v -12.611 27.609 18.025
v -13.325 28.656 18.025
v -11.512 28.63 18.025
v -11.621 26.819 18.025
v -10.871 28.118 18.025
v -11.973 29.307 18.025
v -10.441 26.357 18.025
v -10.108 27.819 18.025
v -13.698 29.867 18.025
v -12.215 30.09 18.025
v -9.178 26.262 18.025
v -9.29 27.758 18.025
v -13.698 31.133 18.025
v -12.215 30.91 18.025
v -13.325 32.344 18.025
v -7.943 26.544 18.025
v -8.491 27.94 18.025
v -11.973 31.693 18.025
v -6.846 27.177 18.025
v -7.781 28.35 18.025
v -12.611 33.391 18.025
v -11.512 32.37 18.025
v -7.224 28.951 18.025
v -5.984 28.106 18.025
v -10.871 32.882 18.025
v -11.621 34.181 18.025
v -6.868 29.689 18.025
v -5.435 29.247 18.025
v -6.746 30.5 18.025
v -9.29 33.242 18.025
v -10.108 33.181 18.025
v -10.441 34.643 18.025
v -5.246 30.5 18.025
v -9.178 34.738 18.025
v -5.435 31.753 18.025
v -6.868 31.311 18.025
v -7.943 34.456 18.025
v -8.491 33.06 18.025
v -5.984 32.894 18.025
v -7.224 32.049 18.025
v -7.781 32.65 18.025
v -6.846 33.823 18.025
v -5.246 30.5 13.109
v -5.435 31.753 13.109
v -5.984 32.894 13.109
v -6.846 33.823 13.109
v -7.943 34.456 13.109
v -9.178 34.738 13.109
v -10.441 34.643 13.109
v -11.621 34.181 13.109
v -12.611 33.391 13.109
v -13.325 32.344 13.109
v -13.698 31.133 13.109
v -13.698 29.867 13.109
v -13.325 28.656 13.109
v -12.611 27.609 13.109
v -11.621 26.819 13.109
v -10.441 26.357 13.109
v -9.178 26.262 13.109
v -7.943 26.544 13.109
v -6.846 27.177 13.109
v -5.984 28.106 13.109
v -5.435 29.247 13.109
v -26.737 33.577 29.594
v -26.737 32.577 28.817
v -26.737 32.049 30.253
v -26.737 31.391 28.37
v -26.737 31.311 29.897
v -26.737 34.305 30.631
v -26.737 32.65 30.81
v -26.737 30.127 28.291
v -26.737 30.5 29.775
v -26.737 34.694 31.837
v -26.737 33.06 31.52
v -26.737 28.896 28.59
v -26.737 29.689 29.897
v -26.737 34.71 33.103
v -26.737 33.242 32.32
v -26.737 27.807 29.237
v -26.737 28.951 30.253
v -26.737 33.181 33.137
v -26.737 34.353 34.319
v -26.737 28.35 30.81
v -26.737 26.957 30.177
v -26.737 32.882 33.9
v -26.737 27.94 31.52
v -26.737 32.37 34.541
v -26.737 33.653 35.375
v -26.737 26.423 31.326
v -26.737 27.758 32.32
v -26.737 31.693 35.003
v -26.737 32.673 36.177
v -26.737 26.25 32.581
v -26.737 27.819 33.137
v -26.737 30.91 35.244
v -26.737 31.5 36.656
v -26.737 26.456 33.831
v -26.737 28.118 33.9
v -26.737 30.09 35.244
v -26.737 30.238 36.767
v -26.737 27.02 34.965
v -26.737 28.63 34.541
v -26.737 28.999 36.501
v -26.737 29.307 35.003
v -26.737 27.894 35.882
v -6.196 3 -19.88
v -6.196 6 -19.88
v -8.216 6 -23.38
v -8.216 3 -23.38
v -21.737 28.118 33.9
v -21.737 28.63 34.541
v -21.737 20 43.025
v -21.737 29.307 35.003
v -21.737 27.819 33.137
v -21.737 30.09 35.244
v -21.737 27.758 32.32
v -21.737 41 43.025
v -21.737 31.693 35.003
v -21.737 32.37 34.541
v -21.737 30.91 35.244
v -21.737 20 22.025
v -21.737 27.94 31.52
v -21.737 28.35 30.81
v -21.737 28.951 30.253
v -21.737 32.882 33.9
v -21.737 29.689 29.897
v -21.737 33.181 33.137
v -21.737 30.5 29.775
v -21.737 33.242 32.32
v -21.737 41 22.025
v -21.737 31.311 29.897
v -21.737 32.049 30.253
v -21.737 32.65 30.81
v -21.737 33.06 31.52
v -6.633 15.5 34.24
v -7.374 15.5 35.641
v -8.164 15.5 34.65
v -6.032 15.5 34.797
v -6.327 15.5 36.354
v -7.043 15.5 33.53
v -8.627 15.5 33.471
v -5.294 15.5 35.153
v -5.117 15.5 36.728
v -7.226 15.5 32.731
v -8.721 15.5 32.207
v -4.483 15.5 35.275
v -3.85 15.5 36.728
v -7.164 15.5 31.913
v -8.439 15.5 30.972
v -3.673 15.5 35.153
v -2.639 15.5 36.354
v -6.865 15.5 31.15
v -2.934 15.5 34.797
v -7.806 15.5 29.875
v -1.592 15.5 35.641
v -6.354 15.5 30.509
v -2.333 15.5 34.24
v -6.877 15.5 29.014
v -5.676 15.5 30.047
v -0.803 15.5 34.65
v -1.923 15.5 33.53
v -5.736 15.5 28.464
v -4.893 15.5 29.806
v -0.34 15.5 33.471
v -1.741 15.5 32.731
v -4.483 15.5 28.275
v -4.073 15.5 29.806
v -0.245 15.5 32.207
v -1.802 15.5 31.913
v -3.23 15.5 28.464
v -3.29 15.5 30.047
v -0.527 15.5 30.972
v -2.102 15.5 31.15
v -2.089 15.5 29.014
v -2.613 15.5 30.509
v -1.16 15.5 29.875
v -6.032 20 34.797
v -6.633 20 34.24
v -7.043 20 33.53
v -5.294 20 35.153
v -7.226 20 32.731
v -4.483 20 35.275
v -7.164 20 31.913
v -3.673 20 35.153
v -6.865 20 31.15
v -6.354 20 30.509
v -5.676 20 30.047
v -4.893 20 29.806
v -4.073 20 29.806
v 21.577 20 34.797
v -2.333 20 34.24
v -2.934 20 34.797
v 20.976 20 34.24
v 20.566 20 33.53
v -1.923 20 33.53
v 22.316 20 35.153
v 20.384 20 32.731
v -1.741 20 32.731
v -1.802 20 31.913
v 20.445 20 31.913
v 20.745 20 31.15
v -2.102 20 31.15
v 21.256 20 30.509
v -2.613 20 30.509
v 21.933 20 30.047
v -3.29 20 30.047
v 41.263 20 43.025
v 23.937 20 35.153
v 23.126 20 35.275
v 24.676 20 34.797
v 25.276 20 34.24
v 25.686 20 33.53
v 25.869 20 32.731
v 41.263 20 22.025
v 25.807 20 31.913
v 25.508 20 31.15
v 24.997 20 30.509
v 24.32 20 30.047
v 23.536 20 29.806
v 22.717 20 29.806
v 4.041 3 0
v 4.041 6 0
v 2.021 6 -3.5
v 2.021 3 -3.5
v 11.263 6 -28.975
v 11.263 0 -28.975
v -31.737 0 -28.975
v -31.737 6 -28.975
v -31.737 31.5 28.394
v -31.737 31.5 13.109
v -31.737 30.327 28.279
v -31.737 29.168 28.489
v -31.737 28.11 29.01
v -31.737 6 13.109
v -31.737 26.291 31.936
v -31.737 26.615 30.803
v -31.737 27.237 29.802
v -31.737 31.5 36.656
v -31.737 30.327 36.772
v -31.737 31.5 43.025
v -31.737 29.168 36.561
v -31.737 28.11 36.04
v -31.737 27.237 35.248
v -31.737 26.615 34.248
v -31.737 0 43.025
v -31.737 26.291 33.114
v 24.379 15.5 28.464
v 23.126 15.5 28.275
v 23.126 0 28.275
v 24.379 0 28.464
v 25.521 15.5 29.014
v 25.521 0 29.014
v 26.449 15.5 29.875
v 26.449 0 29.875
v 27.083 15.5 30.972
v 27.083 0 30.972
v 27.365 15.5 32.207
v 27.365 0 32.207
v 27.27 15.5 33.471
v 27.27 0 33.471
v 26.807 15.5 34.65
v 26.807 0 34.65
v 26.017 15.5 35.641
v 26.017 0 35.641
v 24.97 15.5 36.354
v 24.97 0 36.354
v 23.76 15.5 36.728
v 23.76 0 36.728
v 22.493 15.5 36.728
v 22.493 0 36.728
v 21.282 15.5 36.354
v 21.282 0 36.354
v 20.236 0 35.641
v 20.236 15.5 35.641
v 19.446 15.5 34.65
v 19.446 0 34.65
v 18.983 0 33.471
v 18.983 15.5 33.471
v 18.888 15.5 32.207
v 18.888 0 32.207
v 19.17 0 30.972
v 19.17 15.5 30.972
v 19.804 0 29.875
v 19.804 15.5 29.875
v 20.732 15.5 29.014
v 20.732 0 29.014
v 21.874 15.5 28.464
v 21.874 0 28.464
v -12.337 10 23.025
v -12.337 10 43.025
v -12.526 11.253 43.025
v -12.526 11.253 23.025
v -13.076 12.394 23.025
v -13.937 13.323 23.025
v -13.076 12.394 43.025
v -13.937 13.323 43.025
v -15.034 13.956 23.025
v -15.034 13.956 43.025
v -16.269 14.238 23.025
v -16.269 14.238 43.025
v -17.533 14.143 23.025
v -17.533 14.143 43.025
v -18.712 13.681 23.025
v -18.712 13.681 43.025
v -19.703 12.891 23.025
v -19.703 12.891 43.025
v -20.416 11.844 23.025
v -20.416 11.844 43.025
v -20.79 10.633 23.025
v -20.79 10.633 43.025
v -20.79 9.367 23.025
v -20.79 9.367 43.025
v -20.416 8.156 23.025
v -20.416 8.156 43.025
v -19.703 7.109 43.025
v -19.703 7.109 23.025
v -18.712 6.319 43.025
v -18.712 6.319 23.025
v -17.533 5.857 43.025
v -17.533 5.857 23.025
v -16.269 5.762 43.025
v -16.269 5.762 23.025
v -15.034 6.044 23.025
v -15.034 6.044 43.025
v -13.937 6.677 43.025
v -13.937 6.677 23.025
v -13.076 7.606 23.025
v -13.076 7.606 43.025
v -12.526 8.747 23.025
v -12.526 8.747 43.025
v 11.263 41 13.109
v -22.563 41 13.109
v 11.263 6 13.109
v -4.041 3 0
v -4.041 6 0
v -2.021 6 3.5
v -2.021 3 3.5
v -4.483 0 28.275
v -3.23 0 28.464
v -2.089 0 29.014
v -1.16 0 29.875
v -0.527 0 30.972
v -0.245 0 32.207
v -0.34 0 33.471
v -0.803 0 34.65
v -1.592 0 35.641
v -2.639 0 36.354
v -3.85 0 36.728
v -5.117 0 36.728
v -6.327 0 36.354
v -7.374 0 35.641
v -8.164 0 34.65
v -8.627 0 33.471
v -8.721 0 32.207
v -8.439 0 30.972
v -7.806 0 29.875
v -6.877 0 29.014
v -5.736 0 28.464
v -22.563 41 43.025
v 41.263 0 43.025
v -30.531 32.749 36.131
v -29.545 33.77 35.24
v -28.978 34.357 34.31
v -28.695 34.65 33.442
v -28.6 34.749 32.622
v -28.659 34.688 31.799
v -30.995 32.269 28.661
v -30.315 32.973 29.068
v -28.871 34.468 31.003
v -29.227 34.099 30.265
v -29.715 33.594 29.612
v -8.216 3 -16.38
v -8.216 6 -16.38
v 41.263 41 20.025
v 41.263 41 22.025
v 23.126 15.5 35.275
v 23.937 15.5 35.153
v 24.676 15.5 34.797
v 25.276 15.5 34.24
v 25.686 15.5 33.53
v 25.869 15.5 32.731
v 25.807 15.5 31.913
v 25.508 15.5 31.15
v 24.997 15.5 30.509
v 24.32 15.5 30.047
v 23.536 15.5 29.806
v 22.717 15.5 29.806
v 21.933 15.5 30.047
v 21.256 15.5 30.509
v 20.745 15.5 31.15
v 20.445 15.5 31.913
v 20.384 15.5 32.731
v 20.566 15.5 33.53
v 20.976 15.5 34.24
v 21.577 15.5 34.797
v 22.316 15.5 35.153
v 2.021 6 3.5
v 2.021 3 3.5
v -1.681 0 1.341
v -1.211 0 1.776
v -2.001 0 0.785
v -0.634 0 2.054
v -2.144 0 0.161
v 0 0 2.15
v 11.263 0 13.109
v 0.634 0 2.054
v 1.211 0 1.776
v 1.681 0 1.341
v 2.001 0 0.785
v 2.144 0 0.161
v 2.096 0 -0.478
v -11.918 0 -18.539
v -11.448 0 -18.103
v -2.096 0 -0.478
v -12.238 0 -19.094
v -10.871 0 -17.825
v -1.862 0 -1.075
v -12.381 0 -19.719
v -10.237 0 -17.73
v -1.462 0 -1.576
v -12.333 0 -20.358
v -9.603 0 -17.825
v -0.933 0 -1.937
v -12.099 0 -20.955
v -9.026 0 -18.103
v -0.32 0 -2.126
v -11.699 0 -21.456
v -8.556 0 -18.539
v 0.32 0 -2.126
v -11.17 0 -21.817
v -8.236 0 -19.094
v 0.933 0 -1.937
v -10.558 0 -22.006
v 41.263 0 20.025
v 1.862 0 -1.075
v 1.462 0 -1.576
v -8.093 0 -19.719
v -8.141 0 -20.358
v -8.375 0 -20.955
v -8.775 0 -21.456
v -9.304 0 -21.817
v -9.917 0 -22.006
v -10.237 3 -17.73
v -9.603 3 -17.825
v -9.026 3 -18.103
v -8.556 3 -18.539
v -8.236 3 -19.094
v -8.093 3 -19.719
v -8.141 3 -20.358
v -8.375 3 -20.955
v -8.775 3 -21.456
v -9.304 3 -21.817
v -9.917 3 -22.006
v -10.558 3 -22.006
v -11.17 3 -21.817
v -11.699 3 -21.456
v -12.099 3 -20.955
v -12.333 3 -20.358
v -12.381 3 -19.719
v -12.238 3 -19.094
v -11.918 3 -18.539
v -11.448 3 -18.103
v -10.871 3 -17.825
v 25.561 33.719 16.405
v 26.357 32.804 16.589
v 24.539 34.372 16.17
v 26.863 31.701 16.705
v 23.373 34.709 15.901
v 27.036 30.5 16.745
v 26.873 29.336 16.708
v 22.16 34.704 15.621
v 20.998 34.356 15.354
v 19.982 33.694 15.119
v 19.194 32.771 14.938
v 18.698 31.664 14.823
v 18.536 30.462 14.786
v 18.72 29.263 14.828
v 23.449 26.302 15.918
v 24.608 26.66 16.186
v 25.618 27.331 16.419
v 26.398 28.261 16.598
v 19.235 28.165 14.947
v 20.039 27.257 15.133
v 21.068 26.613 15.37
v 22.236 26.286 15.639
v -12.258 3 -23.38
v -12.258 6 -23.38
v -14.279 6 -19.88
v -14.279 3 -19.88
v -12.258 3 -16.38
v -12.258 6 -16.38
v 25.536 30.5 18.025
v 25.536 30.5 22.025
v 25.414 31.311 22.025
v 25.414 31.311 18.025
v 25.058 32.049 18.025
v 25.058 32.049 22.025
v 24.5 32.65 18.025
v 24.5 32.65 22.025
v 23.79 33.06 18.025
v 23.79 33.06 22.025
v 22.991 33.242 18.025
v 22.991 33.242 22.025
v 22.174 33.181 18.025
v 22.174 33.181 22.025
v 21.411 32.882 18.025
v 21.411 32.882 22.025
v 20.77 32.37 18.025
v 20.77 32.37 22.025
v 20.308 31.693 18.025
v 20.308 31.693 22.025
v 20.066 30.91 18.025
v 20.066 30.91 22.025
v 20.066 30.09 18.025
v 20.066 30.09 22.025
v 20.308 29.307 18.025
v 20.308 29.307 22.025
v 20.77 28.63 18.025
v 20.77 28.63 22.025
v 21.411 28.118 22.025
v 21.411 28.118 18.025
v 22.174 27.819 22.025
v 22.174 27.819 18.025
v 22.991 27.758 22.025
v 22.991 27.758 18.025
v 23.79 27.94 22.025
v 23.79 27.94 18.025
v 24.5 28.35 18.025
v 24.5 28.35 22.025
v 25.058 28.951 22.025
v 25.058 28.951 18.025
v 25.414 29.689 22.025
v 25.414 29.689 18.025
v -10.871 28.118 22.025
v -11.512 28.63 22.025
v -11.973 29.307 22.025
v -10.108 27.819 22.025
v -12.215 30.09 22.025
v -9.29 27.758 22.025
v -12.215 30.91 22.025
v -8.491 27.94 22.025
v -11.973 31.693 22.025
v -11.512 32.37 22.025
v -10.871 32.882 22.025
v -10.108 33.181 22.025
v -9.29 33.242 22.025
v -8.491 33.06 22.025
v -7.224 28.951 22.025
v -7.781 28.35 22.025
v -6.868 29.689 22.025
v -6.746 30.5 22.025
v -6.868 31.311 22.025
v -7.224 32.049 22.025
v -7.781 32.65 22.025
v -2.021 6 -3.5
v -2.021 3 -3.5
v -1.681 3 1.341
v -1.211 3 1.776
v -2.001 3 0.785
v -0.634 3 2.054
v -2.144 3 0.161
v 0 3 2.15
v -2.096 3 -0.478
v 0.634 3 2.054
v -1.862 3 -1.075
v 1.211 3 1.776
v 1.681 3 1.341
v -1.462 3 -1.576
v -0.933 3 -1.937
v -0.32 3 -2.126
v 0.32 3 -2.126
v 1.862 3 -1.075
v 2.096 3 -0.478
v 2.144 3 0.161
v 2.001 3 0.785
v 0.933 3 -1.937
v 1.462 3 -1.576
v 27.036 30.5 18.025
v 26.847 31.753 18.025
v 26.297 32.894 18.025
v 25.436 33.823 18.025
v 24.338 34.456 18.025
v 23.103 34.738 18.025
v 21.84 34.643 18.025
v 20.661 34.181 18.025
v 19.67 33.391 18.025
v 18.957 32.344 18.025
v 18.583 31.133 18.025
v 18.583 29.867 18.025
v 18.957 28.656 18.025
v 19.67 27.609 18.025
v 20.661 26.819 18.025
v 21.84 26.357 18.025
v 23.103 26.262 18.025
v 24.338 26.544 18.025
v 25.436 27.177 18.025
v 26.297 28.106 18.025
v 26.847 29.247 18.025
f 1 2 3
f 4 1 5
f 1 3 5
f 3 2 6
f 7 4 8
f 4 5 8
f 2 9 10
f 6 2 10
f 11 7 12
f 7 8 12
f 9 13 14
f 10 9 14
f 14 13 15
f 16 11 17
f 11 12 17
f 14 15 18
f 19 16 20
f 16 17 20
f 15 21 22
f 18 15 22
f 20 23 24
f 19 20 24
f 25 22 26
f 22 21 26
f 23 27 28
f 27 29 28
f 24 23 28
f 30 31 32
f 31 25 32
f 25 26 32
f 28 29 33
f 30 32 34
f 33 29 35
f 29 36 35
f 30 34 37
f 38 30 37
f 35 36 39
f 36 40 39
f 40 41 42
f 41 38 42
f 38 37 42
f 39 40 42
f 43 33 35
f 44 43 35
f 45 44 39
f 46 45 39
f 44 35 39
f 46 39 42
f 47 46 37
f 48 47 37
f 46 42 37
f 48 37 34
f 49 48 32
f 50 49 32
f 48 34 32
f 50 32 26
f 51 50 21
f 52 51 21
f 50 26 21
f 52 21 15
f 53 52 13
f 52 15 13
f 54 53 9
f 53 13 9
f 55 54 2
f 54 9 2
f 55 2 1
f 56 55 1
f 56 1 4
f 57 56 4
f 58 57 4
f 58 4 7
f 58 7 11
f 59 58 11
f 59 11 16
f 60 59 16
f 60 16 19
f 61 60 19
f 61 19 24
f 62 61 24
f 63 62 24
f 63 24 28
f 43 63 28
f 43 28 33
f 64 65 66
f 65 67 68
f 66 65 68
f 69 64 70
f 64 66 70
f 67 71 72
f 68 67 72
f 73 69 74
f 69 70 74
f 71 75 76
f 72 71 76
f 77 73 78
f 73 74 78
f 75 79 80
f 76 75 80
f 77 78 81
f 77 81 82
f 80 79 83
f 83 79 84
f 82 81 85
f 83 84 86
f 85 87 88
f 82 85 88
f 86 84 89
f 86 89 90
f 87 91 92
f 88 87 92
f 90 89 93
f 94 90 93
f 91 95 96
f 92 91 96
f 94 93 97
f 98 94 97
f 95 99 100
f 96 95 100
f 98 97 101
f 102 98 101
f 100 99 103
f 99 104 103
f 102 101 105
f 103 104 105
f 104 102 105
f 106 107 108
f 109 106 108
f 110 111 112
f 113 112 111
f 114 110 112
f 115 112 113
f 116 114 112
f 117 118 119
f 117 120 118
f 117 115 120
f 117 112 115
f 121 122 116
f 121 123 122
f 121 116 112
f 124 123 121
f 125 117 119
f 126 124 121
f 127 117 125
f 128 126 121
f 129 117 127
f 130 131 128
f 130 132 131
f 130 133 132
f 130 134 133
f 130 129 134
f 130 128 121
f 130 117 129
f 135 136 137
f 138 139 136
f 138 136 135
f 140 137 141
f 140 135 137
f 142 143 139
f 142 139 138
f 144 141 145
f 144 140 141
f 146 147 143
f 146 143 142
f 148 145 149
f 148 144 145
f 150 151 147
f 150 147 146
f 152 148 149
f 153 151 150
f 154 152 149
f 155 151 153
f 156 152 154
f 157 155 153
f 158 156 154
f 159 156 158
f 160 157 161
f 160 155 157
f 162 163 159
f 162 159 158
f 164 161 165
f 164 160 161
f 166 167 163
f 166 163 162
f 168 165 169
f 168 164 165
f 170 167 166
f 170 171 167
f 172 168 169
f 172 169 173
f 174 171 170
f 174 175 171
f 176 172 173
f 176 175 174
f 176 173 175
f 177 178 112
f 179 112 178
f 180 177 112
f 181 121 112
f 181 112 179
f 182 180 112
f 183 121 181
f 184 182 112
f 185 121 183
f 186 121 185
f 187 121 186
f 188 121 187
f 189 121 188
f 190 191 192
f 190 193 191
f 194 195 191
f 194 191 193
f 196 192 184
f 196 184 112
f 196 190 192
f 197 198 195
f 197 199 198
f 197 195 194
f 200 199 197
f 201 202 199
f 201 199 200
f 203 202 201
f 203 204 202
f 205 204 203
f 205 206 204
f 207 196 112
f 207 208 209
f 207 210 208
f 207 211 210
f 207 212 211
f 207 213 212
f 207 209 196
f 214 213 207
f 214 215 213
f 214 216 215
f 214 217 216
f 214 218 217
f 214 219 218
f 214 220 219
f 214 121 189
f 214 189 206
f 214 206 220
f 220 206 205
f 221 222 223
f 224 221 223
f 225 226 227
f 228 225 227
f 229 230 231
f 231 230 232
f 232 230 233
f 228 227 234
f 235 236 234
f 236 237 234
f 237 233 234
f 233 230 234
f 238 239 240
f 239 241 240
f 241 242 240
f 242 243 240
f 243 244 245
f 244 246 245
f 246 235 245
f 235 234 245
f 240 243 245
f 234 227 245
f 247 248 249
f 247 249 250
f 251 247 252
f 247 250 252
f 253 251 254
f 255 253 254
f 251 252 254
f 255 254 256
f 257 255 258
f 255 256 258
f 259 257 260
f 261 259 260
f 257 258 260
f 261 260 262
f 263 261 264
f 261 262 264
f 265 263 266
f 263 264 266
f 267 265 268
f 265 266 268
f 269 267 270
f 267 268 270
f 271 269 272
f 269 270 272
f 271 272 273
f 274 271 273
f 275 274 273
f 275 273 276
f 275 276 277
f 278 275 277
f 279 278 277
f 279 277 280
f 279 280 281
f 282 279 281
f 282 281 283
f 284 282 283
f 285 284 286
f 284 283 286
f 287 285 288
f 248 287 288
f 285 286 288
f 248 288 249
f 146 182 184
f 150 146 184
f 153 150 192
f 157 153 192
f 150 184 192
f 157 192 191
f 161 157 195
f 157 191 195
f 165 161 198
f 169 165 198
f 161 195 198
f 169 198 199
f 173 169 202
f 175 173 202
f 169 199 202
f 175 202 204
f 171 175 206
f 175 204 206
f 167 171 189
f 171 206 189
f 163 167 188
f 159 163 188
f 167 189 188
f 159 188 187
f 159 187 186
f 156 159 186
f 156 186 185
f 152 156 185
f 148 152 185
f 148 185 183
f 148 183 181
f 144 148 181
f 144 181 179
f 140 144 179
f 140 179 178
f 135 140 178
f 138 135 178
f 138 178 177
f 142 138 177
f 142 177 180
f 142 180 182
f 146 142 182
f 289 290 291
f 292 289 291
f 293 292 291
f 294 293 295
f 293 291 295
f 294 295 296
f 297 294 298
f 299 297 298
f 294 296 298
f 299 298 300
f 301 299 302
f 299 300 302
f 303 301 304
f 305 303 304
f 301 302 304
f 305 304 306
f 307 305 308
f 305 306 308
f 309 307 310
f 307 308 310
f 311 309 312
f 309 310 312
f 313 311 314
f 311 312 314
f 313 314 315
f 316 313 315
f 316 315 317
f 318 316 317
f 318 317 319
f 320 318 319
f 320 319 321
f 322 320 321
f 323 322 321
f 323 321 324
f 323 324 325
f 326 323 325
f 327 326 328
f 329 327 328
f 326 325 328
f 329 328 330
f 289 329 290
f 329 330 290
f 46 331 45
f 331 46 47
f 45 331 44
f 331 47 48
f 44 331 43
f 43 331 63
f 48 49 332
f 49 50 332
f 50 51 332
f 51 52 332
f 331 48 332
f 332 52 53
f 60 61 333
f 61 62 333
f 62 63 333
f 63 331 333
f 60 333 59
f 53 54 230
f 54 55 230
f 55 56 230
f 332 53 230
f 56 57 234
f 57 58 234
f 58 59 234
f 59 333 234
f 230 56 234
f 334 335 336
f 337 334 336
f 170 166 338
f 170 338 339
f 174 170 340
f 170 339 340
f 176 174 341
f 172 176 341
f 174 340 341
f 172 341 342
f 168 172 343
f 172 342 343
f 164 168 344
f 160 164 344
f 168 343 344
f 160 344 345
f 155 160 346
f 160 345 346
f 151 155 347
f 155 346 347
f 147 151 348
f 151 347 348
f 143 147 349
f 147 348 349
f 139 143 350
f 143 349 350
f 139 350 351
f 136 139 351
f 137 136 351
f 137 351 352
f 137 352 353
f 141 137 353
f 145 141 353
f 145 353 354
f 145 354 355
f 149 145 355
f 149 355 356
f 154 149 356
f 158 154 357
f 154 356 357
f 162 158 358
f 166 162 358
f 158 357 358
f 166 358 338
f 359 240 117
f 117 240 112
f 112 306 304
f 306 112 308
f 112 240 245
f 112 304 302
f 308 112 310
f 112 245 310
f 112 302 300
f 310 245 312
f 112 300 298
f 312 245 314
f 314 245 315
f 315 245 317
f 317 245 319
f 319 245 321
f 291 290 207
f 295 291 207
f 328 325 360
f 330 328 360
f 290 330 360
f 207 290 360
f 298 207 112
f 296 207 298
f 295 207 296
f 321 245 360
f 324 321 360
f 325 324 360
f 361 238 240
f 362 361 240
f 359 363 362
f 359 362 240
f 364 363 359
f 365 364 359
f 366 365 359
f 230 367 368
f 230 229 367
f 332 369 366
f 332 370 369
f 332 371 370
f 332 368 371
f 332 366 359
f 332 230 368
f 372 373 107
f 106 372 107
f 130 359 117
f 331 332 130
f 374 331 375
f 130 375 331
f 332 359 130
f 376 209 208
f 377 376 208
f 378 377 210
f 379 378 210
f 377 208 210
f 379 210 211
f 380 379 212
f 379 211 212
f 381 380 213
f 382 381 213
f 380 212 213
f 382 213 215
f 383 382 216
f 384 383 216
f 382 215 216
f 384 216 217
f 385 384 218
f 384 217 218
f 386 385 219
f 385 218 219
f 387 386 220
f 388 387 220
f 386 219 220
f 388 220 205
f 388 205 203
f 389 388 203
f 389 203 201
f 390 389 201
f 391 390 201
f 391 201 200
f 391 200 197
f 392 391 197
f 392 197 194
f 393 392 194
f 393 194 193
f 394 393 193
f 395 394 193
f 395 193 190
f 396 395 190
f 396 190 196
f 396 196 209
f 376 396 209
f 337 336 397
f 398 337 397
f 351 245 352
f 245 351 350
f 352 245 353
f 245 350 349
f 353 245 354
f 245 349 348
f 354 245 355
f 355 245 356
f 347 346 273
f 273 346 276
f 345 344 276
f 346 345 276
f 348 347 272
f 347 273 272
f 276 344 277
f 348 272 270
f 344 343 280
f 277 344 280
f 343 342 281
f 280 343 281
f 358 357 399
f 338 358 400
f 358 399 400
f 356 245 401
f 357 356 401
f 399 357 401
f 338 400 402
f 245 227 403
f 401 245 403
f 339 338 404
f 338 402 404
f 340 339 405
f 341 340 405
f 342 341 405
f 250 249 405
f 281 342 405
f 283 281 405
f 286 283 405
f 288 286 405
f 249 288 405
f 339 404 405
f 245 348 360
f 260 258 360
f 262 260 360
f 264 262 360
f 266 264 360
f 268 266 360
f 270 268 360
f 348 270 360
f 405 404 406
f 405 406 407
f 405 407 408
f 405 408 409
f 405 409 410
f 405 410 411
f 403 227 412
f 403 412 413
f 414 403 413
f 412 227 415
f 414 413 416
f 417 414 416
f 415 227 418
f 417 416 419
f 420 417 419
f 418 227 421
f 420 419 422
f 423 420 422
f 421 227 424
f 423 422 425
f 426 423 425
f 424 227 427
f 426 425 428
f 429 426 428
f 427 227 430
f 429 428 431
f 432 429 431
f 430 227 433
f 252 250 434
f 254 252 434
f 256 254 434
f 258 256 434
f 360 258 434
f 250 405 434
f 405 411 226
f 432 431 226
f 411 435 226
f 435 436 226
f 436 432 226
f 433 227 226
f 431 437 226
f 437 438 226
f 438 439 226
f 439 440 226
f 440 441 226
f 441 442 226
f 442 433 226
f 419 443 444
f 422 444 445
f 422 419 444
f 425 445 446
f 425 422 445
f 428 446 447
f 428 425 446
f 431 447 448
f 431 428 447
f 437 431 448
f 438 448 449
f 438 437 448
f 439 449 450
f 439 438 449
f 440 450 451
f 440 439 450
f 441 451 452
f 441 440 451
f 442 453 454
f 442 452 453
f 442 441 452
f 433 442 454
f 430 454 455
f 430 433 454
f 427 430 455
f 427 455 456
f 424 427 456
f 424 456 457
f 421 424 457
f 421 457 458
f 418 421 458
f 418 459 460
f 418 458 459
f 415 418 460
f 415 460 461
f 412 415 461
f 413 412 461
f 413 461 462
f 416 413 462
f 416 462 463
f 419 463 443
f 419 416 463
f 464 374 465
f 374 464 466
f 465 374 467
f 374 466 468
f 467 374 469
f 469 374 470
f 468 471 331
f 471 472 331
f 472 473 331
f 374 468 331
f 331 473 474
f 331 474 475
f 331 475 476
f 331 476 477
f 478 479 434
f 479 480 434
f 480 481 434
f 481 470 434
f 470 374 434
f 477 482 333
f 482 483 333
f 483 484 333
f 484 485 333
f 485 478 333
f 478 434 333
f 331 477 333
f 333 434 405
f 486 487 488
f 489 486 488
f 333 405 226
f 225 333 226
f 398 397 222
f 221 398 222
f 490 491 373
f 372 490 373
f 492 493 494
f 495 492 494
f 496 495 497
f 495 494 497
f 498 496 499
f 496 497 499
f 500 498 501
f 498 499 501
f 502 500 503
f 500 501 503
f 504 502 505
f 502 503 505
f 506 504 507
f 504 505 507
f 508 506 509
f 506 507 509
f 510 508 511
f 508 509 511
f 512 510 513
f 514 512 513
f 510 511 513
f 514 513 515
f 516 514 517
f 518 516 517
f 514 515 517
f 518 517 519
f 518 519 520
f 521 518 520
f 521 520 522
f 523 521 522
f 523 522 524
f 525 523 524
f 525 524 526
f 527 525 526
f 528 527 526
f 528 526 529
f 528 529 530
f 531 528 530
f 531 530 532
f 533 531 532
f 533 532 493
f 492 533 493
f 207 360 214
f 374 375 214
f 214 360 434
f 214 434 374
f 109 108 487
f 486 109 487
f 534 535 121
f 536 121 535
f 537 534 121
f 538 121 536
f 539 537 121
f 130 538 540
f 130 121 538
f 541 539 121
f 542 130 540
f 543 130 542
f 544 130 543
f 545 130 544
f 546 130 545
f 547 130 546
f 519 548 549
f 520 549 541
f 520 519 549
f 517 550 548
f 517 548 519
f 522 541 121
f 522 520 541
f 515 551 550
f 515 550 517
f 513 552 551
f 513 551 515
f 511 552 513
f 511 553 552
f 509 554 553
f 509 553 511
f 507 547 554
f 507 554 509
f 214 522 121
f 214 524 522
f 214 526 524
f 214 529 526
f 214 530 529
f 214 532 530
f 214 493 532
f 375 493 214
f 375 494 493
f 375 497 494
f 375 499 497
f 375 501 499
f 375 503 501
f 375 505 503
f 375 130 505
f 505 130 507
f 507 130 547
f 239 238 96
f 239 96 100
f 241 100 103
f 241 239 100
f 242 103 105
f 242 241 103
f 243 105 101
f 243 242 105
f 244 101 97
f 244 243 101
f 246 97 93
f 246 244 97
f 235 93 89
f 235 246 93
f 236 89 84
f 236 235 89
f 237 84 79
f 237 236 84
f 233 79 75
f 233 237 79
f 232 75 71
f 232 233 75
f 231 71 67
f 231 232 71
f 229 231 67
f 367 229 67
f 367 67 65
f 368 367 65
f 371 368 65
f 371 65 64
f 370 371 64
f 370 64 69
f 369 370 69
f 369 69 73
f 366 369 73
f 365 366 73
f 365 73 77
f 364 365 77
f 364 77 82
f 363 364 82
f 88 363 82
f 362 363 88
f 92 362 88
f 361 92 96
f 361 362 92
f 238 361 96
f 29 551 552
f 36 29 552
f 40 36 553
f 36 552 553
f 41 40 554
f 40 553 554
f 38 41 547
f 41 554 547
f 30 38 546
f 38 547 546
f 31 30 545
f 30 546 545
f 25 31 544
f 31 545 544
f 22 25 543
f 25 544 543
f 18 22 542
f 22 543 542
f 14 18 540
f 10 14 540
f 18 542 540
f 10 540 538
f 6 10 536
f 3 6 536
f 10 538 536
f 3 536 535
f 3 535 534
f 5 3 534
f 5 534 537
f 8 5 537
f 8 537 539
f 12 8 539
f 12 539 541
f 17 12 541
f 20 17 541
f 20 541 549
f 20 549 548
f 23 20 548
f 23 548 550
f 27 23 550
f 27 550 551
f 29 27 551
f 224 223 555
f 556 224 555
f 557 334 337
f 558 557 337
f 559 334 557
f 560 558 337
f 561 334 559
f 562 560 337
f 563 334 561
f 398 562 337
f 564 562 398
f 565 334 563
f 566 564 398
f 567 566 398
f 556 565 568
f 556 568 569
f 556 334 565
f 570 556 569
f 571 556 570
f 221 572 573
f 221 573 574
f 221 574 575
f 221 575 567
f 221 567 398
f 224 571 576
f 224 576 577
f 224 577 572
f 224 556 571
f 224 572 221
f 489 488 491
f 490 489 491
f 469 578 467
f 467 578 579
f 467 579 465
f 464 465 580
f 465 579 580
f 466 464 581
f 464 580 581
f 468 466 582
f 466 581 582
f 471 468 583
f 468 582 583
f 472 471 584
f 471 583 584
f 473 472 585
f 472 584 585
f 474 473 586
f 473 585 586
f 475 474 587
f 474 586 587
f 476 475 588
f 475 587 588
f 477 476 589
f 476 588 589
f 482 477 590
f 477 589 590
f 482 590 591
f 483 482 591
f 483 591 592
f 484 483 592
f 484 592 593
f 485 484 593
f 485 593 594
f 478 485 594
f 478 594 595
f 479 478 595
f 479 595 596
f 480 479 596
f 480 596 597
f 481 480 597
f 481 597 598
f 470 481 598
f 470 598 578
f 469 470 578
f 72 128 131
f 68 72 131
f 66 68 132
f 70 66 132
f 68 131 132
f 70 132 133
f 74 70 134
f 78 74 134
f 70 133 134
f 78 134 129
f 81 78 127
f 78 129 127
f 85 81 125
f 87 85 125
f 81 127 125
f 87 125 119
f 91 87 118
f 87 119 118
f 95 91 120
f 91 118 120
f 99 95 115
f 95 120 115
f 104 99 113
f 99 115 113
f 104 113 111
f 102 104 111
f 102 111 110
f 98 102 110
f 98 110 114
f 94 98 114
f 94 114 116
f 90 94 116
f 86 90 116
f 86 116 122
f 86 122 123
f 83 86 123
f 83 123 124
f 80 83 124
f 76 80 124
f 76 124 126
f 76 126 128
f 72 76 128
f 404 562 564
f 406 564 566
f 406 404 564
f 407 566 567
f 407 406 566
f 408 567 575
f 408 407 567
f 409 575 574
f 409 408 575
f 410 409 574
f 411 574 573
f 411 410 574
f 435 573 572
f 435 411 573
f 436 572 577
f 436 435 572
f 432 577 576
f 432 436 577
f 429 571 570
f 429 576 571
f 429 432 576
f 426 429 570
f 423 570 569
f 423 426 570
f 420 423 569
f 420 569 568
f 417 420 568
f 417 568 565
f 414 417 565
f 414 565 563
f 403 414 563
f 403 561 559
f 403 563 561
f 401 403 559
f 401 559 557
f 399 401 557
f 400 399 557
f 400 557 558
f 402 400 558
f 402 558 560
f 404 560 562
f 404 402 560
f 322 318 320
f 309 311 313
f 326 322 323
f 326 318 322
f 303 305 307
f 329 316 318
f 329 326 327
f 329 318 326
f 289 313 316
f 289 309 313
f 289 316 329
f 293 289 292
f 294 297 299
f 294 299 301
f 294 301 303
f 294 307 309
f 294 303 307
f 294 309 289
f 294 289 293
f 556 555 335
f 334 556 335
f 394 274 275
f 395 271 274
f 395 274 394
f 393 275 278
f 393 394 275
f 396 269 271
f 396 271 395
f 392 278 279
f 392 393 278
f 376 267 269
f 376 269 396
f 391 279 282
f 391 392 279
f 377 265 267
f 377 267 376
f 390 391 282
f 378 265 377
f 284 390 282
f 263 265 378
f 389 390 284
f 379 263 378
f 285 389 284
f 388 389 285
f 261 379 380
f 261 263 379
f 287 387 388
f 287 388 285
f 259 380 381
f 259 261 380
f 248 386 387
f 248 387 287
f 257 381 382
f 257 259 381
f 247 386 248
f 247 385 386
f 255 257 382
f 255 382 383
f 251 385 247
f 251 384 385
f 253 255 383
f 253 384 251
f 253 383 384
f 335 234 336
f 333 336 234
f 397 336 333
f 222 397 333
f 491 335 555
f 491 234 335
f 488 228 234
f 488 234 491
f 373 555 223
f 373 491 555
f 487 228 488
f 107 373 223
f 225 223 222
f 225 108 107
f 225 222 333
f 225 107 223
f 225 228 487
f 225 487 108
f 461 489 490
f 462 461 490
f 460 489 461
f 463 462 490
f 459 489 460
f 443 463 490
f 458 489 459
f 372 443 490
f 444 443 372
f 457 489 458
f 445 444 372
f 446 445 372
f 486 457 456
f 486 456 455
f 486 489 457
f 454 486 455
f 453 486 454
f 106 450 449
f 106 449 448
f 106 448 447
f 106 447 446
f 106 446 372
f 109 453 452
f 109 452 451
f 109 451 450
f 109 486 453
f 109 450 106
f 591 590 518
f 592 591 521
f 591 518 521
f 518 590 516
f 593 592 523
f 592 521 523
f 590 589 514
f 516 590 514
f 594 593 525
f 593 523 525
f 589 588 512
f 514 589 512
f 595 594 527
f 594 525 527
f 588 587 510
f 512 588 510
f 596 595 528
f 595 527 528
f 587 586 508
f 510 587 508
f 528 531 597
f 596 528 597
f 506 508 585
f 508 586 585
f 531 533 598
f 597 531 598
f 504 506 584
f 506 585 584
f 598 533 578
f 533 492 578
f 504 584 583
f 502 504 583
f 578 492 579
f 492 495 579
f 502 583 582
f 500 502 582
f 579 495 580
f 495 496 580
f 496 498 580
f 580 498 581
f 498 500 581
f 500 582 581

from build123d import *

# Parameters (mm, degrees)
SKETCH_1_R          = 2.15
EXTRUDE_1_DEPTH     = 6
EXTRUDE_2_DEPTH     = 35
SKETCH_3_W          = 63
SKETCH_3_H          = 21
CUT_EXTRUDE_1_DEPTH = 21
SKETCH_4_R          = 2.75
CUT_EXTRUDE_2_DEPTH = 87.609201921
CHAMFER_1_SIZE      = 9.5
CHAMFER_1_SIZE_2    = 9.174043361
CUT_EXTRUDE_START   = -10
SKETCH_5_R          = 4.25
CUT_EXTRUDE_3_DEPTH = 5
SKETCH_6_R          = 2.75
CUT_EXTRUDE_4_DEPTH = 78.360370477
CUT_EXTRUDE_START_2 = -4
SKETCH_7_R          = 4.25
CUT_EXTRUDE_5_DEPTH = 5
SKETCH_8_R          = 2.75
CUT_EXTRUDE_6_DEPTH = 64.20427816
SKETCH_10_R         = 4.25
CUT_EXTRUDE_7_DEPTH = 15.5
SKETCH_11_R         = 4.25
CUT_EXTRUDE_8_DEPTH = 20
CUT_EXTRUDE_9_DEPTH = 3


with BuildPart() as part:
    # Эскиз1 → Бобышка-Вытянуть1 (new body)
    with BuildSketch(Plane(origin=(0, 0, 0), x_dir=(1, 0, 0), z_dir=(0, 1, 0))):
        Polygon((-31.737099952, -43.025037564), (41.262900048, -43.025037564), (41.262900048, -20.025037564), (11.262900048, -13.109402144), (11.262900048, 28.974962436), (-31.737099952, 28.974962436), align=None)
        with Locations(Location((-10.237099952, 19.879797383, 0), (0, 0, 270))):
            Circle(SKETCH_1_R, mode=Mode.SUBTRACT)
        with Locations(Location((0, 0, 0), (0, 0, 270))):
            Circle(SKETCH_1_R, mode=Mode.SUBTRACT)
    extrude(amount=EXTRUDE_1_DEPTH)

    # Эскиз2 → Бобышка-Вытянуть2 (add)
    with BuildSketch(Plane(origin=(0, 6, 0), x_dir=(1, 0, 0), z_dir=(0, 1, 0))):
        Polygon((41.262900048, -20.025037564), (11.262900048, -13.109402144), (-31.737099952, -13.109402144), (-31.737099952, -43.025037564), (41.262900048, -43.025037564), align=None)
    extrude(amount=EXTRUDE_2_DEPTH)

    # Эскиз3 → Вырез-Вытянуть1 (cut)
    with BuildSketch(Plane(origin=(0, 41, 0), x_dir=(1, 0, 0), z_dir=(0, 1, 0))):
        with Locations((9.762900048, -32.525037564)):
            Rectangle(SKETCH_3_W, SKETCH_3_H)
    extrude(amount=-CUT_EXTRUDE_1_DEPTH, mode=Mode.SUBTRACT)

    # Эскиз4 → Вырез-Вытянуть2 (cut, through all)
    with BuildSketch(Plane(origin=(-21.737099952, 0, 0), x_dir=(0, 0, -1), z_dir=(1, 0, 0))):
        with Locations((-32.525037564, 30.5)):
            Circle(SKETCH_4_R)
    extrude(amount=-CUT_EXTRUDE_2_DEPTH, mode=Mode.SUBTRACT)

    # Фаска1
    # the kernel refuses this chamfer: 9.5, 9.174043361 mm, written as the material it takes off along each edge
    with BuildSketch(Plane(origin=(-31.737099952, 41, -11.332881065), x_dir=(-0.026999337430198715, -0.9996354514413394, 0), z_dir=(0, 0, 1))) as chamfer_1_piece_1:
        Polygon((CHAMFER_1_SIZE * 0.999635451441, CHAMFER_1_SIZE * 0.0269993374302), (-CHAMFER_1_SIZE_2 * 0.0269993374292, CHAMFER_1_SIZE_2 * 0.999635451405), (0, 0), align=None)
    extrude(amount=78.800201839, mode=Mode.SUBTRACT)

    # Эскиз5 → Вырез-Вытянуть3 (cut)
    with BuildSketch(Plane(origin=(-21.737099952, 0, 0), x_dir=(0, 0, -1), z_dir=(1, 0, 0)).offset(CUT_EXTRUDE_START)):
        with Locations(Location((-32.525037564, 30.5, 0), (0, 0, 166.391039369))):
            Circle(SKETCH_5_R)
    extrude(amount=CUT_EXTRUDE_3_DEPTH, mode=Mode.SUBTRACT)

    # Эскиз6 → Вырез-Вытянуть4 (cut, through all)
    with BuildSketch(Plane.XY.offset(22.025037564)):
        with Locations((-9.495708976, 30.5)):
            Circle(SKETCH_6_R)
        with Locations((22.785725254, 30.5)):
            Circle(SKETCH_6_R)
    extrude(amount=-CUT_EXTRUDE_4_DEPTH, mode=Mode.SUBTRACT)

    # Эскиз7 → Вырез-Вытянуть5 (cut)
    with BuildSketch(Plane.XY.offset(22.025037564).offset(CUT_EXTRUDE_START_2)):
        with Locations((-9.495708976, 30.5)):
            Circle(SKETCH_7_R)
        with Locations((22.785725254, 30.5)):
            Circle(SKETCH_7_R)
    extrude(amount=-CUT_EXTRUDE_5_DEPTH, mode=Mode.SUBTRACT)

    # Эскиз8 → Вырез-Вытянуть6 (cut, through all)
    with BuildSketch(Plane(origin=(0, 20, 0), x_dir=(1, 0, 0), z_dir=(0, 1, 0))):
        with Locations(Location((-4.483206982, -32.525037564, 0), (0, 0, 270))):
            Circle(SKETCH_8_R)
        with Locations(Location((23.126402015, -32.525037564, 0), (0, 0, 270))):
            Circle(SKETCH_8_R)
    extrude(amount=-CUT_EXTRUDE_6_DEPTH, mode=Mode.SUBTRACT)

    # Эскиз10 → Вырез-Вытянуть7 (cut)
    with BuildSketch(Plane.XZ):
        with Locations(Location((23.126402015, 32.525037564, 0), (0, 0, 270))):
            Circle(SKETCH_10_R)
        with Locations(Location((-4.483206982, 32.525037564, 0), (0, 0, 270))):
            Circle(SKETCH_10_R)
    extrude(amount=-CUT_EXTRUDE_7_DEPTH, mode=Mode.SUBTRACT)

    # Эскиз11 → Вырез-Вытянуть8 (cut)
    with BuildSketch(Plane.XY.offset(43.025037564)):
        with Locations((-16.587099952, 10)):
            Circle(SKETCH_11_R)
    extrude(amount=-CUT_EXTRUDE_8_DEPTH, mode=Mode.SUBTRACT)

    # Эскиз12 → Вырез-Вытянуть9 (cut)
    with BuildSketch(Plane(origin=(0, 6, 0), x_dir=(1, 0, 0), z_dir=(0, 1, 0))):
        Polygon((-6.195648068, 19.879797383), (-8.21637401, 23.379797383), (-12.257825894, 23.379797383), (-14.278551837, 19.879797383), (-12.257825894, 16.379797383), (-8.21637401, 16.379797383), align=None)
        Polygon((4.041451884, 0), (2.020725942, 3.5), (-2.020725942, 3.5), (-4.041451884, 0), (-2.020725942, -3.5), (2.020725942, -3.5), align=None)
    extrude(amount=-CUT_EXTRUDE_9_DEPTH, mode=Mode.SUBTRACT)


solid = part.part
